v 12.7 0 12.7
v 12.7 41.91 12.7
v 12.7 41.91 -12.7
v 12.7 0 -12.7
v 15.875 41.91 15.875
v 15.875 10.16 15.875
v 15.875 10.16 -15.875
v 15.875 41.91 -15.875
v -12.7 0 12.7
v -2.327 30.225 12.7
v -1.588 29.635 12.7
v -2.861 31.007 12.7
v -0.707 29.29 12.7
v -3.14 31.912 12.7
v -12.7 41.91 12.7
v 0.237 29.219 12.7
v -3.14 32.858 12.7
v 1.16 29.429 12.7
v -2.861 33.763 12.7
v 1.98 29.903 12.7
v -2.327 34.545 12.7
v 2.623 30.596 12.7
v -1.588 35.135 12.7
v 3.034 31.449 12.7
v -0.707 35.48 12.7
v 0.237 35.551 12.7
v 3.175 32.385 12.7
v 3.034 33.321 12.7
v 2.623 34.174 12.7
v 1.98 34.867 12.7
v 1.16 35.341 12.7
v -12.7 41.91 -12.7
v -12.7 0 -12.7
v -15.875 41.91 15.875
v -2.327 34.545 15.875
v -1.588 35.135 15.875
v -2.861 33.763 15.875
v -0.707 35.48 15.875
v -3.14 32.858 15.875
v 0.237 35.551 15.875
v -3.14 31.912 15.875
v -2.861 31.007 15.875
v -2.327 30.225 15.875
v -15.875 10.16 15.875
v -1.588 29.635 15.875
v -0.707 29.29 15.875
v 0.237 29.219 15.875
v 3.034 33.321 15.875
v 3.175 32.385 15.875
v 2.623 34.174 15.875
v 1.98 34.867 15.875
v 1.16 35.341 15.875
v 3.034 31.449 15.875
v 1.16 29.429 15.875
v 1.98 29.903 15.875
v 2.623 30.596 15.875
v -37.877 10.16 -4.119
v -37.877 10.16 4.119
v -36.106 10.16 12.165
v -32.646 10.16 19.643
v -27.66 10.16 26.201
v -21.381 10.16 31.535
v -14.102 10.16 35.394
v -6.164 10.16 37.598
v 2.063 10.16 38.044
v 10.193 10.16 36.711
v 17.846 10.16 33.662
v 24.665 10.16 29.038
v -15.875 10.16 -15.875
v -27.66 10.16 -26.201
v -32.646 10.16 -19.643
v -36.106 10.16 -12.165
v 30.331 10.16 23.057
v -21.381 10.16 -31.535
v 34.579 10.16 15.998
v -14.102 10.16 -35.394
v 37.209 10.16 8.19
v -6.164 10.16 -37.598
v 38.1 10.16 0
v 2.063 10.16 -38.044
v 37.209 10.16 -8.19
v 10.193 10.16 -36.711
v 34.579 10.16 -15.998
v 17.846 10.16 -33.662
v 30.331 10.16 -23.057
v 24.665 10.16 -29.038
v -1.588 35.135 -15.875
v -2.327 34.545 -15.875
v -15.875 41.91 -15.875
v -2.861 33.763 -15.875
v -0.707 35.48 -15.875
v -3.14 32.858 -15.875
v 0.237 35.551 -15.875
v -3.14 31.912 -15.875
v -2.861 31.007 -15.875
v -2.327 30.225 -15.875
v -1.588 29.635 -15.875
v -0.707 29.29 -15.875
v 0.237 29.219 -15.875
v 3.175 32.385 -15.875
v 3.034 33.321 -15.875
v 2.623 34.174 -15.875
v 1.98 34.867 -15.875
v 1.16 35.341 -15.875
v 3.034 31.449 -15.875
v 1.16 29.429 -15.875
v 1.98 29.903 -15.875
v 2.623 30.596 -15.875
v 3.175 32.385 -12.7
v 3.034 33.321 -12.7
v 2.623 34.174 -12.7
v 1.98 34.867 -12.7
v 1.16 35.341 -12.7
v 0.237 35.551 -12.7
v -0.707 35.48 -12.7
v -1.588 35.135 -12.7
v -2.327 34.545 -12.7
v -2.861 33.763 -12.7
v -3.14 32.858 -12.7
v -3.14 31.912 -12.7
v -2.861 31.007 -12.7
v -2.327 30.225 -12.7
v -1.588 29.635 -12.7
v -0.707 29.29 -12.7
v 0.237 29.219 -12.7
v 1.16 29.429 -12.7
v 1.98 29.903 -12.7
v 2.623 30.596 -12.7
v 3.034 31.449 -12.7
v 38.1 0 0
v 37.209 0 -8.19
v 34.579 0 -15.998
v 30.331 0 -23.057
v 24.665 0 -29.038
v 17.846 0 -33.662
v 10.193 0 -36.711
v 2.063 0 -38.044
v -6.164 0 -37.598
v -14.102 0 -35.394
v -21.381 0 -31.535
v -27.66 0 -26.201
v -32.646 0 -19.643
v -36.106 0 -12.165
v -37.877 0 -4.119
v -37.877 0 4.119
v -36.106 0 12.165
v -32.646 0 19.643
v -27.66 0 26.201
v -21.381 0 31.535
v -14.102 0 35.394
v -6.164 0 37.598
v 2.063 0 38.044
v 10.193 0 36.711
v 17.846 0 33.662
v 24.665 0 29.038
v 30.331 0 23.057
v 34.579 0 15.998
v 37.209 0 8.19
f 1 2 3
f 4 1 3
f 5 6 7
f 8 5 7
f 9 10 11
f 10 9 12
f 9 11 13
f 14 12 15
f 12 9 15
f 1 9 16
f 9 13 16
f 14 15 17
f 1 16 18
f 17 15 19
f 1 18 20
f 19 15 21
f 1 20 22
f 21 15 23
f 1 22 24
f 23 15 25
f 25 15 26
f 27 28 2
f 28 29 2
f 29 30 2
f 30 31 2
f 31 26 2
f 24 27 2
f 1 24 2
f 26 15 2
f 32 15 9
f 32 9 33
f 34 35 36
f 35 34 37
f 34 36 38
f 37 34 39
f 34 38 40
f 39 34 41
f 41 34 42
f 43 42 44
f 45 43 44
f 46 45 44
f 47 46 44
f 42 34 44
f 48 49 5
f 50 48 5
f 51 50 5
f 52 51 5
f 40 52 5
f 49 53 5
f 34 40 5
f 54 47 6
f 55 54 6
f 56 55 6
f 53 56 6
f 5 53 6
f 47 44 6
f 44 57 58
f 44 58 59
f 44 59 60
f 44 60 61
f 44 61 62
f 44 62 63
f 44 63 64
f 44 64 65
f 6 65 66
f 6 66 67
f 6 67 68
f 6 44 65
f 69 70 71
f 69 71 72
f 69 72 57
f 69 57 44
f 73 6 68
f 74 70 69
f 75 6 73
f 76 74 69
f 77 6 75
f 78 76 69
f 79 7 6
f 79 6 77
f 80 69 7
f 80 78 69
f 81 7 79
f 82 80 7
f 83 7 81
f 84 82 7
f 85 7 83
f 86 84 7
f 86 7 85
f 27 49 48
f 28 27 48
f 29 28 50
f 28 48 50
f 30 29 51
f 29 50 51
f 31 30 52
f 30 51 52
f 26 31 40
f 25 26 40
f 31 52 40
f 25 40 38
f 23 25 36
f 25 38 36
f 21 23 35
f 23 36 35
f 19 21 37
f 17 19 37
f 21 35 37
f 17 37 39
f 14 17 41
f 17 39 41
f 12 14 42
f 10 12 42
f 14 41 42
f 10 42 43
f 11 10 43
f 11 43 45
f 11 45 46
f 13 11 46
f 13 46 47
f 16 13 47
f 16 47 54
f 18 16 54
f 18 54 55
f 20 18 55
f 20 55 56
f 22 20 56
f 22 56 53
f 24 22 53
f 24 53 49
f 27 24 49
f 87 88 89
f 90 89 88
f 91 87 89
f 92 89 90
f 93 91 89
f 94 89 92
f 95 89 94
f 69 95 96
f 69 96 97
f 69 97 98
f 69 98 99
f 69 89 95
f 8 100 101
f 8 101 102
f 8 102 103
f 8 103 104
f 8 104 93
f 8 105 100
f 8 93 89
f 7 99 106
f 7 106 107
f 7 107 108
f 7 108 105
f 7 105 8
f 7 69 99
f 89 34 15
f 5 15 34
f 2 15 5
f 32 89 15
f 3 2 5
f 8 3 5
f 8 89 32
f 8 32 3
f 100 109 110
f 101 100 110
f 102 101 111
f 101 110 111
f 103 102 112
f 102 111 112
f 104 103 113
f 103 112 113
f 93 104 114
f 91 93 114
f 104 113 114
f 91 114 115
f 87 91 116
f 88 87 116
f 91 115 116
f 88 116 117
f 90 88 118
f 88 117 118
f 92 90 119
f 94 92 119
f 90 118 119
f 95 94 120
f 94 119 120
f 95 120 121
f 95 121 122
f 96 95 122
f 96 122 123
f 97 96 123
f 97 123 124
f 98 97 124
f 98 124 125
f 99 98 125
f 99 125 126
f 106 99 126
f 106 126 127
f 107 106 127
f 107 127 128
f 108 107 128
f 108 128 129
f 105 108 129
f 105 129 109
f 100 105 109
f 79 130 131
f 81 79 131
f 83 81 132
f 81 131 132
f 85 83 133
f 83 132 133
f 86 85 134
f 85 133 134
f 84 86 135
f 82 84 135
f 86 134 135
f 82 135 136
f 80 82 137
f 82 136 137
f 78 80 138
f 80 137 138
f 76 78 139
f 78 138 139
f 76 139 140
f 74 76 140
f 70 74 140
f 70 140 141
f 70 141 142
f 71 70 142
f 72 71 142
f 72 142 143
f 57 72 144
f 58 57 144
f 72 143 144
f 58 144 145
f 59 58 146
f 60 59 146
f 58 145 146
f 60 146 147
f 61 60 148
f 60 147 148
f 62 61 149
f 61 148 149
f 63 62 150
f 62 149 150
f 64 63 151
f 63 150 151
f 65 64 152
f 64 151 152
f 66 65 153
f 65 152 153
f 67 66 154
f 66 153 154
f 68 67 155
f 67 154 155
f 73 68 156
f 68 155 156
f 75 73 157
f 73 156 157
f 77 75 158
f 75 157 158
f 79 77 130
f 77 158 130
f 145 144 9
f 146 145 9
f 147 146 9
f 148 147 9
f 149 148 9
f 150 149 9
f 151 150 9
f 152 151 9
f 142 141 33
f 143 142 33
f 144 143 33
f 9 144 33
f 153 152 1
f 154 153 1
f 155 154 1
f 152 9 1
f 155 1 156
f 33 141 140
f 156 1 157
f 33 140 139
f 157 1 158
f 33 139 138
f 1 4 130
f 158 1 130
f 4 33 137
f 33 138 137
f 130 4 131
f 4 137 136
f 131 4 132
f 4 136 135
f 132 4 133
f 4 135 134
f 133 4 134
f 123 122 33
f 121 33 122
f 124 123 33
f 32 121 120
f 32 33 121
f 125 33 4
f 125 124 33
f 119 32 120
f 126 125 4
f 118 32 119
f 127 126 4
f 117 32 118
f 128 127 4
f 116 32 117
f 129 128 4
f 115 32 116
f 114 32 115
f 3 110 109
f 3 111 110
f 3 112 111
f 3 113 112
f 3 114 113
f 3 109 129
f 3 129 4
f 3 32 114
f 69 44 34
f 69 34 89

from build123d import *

# Parameters (mm, degrees)
SKETCH1_R           = 38.1
BOSS_EXTRUDE1_DEPTH = 10.16
SKETCH2_W           = 31.75
SKETCH2_H           = 31.75
BOSS_EXTRUDE3_DEPTH = 31.75
SKETCH3_W           = 25.4
SKETCH3_H           = 25.4
CUT_EXTRUDE1_DEPTH  = 42.91
SKETCH4_R           = 3.175
CUT_EXTRUDE2_DEPTH  = 54.975


with BuildPart() as part:
    # Sketch1 → Boss-Extrude1 (new body)
    with BuildSketch(Plane(origin=(0, 0, 0), x_dir=(1, 0, 0), z_dir=(0, 1, 0))):
        Circle(SKETCH1_R)
    extrude(amount=BOSS_EXTRUDE1_DEPTH)

    # Sketch2 → Boss-Extrude3 (add)
    with BuildSketch(Plane(origin=(0, 10.16, 0), x_dir=(1, 0, 0), z_dir=(0, 1, 0))):
        Rectangle(SKETCH2_W, SKETCH2_H)
    extrude(amount=BOSS_EXTRUDE3_DEPTH)

    # Sketch3 → Cut-Extrude1 (cut, through all)
    with BuildSketch(Plane(origin=(0, 41.91, 0), x_dir=(1, 0, 0), z_dir=(0, 1, 0))):
        Rectangle(SKETCH3_W, SKETCH3_H)
    extrude(amount=-CUT_EXTRUDE1_DEPTH, mode=Mode.SUBTRACT)

    # Sketch4 → Cut-Extrude2 (cut, through all)
    with BuildSketch(Plane.XY.offset(15.875)):
        with Locations((0, 32.385)):
            Circle(SKETCH4_R)
    extrude(amount=-CUT_EXTRUDE2_DEPTH, mode=Mode.SUBTRACT)


solid = part.part
